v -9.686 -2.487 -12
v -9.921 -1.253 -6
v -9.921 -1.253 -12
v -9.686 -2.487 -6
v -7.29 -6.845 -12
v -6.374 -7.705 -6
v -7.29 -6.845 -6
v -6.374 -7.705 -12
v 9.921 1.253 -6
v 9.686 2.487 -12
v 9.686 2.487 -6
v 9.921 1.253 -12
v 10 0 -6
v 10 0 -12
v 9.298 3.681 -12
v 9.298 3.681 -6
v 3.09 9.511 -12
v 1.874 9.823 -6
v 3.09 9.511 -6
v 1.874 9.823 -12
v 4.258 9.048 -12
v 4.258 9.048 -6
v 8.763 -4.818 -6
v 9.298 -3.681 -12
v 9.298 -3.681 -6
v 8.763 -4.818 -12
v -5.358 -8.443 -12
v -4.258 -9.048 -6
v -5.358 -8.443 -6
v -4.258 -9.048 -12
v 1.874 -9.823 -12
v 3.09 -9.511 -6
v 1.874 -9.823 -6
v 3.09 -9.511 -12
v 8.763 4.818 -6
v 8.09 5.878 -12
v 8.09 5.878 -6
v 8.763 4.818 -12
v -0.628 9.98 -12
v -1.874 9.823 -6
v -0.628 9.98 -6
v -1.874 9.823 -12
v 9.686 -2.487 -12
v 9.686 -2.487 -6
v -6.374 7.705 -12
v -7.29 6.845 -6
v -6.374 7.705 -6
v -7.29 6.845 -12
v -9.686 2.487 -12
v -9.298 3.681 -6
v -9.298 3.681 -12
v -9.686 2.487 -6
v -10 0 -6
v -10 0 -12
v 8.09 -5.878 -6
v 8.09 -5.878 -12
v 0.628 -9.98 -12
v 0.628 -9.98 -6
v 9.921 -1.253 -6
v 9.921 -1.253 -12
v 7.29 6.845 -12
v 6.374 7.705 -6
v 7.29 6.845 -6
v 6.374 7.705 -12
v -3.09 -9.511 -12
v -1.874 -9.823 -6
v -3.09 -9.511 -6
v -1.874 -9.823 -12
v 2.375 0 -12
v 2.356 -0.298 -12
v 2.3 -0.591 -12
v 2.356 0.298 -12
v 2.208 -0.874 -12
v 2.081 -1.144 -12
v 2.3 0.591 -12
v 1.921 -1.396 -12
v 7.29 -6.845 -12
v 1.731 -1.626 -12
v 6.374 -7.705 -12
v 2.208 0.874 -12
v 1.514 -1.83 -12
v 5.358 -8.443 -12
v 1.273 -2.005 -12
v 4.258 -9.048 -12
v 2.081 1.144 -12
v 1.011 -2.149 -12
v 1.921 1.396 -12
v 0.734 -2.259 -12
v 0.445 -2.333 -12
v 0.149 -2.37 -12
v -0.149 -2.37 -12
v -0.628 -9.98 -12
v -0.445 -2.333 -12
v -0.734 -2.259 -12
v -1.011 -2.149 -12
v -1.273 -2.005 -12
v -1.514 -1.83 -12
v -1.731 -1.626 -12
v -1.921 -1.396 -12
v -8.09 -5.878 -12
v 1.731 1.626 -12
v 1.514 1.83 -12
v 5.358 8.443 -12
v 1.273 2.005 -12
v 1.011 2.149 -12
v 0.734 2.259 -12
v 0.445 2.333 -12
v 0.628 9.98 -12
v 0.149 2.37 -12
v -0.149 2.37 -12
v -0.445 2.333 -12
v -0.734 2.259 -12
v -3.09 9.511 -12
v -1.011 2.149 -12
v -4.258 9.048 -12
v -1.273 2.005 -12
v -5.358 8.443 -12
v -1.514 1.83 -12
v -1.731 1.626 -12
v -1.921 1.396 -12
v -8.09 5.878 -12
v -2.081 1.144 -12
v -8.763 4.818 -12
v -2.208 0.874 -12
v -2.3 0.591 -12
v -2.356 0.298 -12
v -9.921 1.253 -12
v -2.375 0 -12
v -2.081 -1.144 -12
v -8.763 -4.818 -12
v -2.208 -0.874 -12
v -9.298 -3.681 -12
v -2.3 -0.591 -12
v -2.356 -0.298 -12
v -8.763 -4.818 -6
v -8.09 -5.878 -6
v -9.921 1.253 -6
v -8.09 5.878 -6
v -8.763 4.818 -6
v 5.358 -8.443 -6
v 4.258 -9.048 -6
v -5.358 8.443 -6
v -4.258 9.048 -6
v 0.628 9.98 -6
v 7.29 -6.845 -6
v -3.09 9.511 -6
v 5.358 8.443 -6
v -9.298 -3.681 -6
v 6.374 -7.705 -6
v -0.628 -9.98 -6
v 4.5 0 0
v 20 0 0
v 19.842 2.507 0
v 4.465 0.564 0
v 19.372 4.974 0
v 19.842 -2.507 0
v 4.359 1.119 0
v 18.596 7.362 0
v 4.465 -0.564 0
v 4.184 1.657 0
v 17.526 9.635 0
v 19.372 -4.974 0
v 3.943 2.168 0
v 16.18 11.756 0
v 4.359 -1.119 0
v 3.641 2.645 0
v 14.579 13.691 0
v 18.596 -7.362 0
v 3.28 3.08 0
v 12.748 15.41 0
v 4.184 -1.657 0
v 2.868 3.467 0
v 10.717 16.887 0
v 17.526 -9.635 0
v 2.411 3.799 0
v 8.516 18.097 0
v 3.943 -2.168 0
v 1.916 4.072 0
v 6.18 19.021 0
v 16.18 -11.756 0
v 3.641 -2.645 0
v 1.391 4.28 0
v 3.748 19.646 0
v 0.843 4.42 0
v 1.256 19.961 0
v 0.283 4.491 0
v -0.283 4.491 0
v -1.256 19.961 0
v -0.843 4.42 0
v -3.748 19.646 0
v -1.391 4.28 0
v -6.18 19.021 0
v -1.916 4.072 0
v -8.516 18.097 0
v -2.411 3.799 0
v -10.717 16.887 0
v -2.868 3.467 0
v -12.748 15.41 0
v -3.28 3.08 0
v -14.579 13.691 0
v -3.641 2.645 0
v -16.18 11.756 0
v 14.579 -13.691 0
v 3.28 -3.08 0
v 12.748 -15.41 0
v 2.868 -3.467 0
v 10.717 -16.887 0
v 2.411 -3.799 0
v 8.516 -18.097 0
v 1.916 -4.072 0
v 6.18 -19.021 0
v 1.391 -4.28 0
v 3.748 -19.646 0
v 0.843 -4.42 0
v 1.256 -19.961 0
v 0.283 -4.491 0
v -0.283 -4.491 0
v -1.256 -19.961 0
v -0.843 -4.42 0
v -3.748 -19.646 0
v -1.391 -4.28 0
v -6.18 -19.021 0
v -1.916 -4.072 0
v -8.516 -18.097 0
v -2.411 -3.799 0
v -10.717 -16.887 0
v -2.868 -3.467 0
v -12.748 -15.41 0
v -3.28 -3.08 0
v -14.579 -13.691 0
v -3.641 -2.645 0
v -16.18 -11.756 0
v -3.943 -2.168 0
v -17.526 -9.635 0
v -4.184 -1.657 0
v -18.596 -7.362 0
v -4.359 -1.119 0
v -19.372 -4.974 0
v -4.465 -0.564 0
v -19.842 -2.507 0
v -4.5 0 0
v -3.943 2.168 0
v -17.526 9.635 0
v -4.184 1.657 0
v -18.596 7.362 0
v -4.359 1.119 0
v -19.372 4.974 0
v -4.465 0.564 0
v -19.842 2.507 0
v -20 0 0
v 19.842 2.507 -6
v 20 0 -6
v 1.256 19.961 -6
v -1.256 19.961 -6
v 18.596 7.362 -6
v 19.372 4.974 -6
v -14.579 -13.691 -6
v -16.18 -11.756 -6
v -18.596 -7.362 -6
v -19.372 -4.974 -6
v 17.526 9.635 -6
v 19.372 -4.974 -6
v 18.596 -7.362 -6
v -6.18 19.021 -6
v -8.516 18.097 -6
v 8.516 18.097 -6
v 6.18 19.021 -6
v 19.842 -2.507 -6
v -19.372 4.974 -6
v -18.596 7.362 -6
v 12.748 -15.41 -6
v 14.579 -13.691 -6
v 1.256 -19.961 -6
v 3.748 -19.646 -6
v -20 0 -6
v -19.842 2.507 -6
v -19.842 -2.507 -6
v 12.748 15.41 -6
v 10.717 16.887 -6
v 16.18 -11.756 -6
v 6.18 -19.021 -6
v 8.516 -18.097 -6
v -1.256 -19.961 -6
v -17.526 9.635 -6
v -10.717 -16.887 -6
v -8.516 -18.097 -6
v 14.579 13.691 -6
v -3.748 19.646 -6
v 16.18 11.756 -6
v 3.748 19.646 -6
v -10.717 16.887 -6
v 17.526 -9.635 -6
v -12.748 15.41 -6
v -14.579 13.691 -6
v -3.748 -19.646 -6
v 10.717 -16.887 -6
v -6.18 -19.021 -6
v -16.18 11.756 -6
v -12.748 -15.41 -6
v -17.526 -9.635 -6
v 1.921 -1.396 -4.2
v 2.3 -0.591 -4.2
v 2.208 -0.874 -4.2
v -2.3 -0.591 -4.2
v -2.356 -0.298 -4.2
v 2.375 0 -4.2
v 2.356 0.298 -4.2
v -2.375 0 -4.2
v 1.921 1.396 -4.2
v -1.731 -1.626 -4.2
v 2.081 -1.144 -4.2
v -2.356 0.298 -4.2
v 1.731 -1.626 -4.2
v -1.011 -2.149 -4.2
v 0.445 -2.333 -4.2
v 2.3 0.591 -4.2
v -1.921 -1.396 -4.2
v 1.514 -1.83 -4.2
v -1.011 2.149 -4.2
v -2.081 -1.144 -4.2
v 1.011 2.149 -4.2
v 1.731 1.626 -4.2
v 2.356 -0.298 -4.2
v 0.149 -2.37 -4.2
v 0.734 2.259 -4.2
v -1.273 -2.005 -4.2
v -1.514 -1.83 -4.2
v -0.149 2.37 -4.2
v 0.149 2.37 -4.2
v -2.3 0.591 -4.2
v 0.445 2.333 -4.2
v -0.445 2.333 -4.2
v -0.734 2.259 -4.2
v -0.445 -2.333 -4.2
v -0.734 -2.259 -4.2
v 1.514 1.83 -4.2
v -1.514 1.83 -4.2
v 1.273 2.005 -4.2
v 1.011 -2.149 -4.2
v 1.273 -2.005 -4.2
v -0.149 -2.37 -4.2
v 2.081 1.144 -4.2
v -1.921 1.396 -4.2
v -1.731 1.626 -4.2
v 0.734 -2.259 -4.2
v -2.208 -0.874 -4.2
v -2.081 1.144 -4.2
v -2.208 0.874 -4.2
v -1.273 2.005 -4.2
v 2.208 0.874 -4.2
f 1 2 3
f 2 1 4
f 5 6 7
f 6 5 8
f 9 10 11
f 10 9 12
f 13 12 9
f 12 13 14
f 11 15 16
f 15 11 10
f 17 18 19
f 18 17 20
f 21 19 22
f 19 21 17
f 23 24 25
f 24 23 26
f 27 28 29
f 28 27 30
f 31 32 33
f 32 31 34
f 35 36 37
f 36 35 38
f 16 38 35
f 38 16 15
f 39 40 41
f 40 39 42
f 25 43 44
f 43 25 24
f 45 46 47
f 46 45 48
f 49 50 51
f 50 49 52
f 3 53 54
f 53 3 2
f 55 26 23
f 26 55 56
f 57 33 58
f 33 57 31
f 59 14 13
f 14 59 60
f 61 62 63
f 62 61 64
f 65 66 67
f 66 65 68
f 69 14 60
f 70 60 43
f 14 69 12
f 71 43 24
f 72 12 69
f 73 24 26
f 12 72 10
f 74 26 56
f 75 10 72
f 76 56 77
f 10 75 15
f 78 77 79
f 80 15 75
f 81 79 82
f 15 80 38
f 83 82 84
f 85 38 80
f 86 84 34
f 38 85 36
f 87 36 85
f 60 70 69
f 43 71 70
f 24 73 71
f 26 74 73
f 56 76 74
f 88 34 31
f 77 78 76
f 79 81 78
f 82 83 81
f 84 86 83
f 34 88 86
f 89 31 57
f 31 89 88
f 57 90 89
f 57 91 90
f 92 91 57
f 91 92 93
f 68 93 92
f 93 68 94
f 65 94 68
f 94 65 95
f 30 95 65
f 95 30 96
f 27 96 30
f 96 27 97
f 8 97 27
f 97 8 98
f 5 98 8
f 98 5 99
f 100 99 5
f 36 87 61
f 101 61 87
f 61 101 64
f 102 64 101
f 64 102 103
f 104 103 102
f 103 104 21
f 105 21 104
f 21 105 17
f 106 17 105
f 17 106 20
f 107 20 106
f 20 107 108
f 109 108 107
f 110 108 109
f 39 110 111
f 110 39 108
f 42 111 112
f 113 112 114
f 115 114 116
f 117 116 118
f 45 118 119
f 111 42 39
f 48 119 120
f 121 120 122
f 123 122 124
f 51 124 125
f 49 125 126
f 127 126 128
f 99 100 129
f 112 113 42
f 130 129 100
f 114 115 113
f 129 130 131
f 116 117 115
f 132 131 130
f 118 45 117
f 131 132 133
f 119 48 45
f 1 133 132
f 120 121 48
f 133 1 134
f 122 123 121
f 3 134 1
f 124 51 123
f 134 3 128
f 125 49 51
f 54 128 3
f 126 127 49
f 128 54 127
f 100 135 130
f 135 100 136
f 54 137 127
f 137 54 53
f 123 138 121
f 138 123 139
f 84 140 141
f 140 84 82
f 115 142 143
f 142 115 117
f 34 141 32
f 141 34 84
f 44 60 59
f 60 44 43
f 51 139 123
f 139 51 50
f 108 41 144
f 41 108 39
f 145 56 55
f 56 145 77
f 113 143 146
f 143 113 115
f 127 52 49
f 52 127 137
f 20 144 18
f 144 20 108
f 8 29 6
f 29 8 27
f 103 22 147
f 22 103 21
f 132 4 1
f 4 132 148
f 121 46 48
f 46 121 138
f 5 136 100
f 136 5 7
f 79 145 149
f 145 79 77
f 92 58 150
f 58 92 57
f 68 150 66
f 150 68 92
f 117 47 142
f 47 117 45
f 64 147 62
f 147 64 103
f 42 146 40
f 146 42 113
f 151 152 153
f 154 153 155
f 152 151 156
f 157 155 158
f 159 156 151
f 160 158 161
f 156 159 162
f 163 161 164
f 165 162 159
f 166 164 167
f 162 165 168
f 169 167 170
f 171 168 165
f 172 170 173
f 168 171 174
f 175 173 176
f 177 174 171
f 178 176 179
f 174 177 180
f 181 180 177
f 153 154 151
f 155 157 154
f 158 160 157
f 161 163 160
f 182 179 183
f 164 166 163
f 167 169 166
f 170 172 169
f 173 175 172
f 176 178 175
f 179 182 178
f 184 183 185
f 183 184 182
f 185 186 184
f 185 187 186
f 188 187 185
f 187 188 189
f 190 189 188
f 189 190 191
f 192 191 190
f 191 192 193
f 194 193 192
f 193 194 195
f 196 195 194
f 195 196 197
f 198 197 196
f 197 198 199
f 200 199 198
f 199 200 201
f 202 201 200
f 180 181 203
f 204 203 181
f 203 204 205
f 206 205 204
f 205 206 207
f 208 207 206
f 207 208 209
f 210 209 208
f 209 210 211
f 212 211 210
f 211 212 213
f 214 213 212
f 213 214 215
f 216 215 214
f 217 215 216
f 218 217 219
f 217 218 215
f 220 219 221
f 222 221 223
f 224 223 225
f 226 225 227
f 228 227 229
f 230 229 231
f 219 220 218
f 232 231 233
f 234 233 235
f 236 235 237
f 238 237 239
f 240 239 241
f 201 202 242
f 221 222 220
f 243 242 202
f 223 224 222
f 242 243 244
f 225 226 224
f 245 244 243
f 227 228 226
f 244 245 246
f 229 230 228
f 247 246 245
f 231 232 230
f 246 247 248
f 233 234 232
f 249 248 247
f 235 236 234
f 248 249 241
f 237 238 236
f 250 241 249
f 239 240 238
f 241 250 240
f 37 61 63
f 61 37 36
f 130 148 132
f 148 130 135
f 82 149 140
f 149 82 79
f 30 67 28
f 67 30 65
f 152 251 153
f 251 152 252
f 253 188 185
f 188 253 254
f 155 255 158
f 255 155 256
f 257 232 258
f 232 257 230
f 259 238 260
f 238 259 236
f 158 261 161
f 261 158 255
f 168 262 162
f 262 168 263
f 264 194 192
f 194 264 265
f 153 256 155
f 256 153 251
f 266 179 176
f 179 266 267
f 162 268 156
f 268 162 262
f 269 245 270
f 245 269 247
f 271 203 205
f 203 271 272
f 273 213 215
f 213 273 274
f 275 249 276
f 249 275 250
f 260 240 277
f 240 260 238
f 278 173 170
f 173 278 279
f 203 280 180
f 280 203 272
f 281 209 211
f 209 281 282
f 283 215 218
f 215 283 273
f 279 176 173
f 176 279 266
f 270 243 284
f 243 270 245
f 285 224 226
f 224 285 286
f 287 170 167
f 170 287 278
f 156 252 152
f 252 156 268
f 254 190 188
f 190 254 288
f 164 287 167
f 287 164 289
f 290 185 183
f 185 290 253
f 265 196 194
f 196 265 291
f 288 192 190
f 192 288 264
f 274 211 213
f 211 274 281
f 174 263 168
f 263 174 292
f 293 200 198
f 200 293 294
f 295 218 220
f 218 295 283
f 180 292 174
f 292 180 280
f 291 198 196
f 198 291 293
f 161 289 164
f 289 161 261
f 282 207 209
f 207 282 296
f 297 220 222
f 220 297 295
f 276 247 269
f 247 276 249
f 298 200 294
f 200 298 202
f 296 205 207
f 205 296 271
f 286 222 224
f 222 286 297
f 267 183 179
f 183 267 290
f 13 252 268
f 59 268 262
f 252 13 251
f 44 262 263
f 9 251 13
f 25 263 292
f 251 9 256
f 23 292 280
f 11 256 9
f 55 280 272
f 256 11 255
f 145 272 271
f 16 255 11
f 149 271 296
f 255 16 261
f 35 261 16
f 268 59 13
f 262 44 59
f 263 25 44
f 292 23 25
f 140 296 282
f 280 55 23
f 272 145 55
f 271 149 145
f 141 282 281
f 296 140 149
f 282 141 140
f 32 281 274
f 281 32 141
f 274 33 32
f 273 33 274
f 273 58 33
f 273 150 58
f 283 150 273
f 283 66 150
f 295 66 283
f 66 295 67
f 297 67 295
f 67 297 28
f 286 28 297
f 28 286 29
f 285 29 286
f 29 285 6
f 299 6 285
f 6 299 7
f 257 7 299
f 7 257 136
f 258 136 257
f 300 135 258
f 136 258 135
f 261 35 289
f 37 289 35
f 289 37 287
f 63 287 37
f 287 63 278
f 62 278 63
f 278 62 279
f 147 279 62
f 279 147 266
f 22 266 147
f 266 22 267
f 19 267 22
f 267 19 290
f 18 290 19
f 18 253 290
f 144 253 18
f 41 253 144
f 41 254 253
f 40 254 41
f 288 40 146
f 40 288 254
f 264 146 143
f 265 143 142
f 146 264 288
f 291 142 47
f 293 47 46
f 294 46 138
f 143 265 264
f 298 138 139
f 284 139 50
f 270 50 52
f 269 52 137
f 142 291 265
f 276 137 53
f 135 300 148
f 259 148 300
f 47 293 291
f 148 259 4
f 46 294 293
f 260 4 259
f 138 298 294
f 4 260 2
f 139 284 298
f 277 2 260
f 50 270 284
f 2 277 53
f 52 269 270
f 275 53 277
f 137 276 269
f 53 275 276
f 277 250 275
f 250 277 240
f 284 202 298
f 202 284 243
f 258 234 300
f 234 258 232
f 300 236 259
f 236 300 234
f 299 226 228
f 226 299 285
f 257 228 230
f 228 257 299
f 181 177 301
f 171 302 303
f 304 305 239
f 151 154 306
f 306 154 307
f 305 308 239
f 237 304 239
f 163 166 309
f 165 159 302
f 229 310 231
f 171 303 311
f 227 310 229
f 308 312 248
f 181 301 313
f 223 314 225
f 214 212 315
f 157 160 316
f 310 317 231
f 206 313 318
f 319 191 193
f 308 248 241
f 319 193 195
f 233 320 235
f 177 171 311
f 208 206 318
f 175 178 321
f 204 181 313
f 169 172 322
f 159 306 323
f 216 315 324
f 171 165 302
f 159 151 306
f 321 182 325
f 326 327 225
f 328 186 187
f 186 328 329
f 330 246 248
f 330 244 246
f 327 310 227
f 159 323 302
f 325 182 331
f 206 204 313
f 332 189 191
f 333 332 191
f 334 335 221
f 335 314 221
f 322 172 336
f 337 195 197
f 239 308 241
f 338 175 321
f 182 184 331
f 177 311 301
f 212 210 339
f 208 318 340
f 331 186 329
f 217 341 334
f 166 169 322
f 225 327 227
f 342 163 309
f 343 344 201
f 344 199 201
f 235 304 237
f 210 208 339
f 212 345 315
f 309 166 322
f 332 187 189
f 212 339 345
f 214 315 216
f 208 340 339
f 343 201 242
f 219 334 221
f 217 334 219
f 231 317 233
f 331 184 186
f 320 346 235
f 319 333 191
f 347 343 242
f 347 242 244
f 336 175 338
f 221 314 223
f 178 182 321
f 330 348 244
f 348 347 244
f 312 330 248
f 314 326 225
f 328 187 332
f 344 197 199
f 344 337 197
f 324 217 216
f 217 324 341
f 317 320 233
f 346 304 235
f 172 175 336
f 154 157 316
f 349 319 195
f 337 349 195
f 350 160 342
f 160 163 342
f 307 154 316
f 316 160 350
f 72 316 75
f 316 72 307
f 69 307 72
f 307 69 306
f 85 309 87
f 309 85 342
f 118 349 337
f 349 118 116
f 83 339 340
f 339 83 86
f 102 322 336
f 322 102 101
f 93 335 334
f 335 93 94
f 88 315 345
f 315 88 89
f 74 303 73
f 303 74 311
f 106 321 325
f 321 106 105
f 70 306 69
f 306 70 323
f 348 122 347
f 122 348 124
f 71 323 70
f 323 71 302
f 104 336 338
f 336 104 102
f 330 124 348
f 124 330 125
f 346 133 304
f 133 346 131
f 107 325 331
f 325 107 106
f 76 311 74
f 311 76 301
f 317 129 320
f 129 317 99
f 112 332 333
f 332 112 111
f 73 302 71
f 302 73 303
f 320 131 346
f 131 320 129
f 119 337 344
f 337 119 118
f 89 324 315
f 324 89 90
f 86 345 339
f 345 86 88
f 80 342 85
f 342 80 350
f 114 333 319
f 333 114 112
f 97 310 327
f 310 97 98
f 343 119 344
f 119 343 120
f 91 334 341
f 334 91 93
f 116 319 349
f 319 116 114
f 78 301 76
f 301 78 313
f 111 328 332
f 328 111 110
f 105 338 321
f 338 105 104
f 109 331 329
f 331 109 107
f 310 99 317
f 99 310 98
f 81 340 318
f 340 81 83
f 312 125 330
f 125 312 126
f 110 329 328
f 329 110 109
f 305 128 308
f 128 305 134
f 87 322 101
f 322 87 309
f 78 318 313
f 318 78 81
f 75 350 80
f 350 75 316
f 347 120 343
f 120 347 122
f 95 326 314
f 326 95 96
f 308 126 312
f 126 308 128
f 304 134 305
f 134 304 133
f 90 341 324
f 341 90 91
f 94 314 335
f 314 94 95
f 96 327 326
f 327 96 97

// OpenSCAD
$fn = 50;


difference() {
	union() {
		translate(v = [0, 0, -12.0000000000]) {
			cylinder(h = 12, r = 10.0000000000);
		}
		translate(v = [0, 0, -6.0000000000]) {
			cylinder(h = 6, r = 20.0000000000);
		}
	}
	union() {
		translate(v = [0, 0, 0]) {
			rotate(a = [0, 0, 0]) {
				difference() {
					union() {
						#translate(v = [0, 0, -12.0000000000]) {
							cylinder(h = 12, r = 2.2500000000);
						}
						#translate(v = [0, 0, -4.2000000000]) {
							cylinder(h = 4.2000000000, r = 10.0000000000, r1 = 2.3750000000, r2 = 4.5000000000);
						}
						#translate(v = [0, 0, -12.0000000000]) {
							cylinder(h = 12, r = 2.3750000000);
						}
						#translate(v = [0, 0, -12.0000000000]) {
							cylinder(h = 12, r = 2.2500000000);
						}
					}
					union();
				}
			}
		}
	}
}
